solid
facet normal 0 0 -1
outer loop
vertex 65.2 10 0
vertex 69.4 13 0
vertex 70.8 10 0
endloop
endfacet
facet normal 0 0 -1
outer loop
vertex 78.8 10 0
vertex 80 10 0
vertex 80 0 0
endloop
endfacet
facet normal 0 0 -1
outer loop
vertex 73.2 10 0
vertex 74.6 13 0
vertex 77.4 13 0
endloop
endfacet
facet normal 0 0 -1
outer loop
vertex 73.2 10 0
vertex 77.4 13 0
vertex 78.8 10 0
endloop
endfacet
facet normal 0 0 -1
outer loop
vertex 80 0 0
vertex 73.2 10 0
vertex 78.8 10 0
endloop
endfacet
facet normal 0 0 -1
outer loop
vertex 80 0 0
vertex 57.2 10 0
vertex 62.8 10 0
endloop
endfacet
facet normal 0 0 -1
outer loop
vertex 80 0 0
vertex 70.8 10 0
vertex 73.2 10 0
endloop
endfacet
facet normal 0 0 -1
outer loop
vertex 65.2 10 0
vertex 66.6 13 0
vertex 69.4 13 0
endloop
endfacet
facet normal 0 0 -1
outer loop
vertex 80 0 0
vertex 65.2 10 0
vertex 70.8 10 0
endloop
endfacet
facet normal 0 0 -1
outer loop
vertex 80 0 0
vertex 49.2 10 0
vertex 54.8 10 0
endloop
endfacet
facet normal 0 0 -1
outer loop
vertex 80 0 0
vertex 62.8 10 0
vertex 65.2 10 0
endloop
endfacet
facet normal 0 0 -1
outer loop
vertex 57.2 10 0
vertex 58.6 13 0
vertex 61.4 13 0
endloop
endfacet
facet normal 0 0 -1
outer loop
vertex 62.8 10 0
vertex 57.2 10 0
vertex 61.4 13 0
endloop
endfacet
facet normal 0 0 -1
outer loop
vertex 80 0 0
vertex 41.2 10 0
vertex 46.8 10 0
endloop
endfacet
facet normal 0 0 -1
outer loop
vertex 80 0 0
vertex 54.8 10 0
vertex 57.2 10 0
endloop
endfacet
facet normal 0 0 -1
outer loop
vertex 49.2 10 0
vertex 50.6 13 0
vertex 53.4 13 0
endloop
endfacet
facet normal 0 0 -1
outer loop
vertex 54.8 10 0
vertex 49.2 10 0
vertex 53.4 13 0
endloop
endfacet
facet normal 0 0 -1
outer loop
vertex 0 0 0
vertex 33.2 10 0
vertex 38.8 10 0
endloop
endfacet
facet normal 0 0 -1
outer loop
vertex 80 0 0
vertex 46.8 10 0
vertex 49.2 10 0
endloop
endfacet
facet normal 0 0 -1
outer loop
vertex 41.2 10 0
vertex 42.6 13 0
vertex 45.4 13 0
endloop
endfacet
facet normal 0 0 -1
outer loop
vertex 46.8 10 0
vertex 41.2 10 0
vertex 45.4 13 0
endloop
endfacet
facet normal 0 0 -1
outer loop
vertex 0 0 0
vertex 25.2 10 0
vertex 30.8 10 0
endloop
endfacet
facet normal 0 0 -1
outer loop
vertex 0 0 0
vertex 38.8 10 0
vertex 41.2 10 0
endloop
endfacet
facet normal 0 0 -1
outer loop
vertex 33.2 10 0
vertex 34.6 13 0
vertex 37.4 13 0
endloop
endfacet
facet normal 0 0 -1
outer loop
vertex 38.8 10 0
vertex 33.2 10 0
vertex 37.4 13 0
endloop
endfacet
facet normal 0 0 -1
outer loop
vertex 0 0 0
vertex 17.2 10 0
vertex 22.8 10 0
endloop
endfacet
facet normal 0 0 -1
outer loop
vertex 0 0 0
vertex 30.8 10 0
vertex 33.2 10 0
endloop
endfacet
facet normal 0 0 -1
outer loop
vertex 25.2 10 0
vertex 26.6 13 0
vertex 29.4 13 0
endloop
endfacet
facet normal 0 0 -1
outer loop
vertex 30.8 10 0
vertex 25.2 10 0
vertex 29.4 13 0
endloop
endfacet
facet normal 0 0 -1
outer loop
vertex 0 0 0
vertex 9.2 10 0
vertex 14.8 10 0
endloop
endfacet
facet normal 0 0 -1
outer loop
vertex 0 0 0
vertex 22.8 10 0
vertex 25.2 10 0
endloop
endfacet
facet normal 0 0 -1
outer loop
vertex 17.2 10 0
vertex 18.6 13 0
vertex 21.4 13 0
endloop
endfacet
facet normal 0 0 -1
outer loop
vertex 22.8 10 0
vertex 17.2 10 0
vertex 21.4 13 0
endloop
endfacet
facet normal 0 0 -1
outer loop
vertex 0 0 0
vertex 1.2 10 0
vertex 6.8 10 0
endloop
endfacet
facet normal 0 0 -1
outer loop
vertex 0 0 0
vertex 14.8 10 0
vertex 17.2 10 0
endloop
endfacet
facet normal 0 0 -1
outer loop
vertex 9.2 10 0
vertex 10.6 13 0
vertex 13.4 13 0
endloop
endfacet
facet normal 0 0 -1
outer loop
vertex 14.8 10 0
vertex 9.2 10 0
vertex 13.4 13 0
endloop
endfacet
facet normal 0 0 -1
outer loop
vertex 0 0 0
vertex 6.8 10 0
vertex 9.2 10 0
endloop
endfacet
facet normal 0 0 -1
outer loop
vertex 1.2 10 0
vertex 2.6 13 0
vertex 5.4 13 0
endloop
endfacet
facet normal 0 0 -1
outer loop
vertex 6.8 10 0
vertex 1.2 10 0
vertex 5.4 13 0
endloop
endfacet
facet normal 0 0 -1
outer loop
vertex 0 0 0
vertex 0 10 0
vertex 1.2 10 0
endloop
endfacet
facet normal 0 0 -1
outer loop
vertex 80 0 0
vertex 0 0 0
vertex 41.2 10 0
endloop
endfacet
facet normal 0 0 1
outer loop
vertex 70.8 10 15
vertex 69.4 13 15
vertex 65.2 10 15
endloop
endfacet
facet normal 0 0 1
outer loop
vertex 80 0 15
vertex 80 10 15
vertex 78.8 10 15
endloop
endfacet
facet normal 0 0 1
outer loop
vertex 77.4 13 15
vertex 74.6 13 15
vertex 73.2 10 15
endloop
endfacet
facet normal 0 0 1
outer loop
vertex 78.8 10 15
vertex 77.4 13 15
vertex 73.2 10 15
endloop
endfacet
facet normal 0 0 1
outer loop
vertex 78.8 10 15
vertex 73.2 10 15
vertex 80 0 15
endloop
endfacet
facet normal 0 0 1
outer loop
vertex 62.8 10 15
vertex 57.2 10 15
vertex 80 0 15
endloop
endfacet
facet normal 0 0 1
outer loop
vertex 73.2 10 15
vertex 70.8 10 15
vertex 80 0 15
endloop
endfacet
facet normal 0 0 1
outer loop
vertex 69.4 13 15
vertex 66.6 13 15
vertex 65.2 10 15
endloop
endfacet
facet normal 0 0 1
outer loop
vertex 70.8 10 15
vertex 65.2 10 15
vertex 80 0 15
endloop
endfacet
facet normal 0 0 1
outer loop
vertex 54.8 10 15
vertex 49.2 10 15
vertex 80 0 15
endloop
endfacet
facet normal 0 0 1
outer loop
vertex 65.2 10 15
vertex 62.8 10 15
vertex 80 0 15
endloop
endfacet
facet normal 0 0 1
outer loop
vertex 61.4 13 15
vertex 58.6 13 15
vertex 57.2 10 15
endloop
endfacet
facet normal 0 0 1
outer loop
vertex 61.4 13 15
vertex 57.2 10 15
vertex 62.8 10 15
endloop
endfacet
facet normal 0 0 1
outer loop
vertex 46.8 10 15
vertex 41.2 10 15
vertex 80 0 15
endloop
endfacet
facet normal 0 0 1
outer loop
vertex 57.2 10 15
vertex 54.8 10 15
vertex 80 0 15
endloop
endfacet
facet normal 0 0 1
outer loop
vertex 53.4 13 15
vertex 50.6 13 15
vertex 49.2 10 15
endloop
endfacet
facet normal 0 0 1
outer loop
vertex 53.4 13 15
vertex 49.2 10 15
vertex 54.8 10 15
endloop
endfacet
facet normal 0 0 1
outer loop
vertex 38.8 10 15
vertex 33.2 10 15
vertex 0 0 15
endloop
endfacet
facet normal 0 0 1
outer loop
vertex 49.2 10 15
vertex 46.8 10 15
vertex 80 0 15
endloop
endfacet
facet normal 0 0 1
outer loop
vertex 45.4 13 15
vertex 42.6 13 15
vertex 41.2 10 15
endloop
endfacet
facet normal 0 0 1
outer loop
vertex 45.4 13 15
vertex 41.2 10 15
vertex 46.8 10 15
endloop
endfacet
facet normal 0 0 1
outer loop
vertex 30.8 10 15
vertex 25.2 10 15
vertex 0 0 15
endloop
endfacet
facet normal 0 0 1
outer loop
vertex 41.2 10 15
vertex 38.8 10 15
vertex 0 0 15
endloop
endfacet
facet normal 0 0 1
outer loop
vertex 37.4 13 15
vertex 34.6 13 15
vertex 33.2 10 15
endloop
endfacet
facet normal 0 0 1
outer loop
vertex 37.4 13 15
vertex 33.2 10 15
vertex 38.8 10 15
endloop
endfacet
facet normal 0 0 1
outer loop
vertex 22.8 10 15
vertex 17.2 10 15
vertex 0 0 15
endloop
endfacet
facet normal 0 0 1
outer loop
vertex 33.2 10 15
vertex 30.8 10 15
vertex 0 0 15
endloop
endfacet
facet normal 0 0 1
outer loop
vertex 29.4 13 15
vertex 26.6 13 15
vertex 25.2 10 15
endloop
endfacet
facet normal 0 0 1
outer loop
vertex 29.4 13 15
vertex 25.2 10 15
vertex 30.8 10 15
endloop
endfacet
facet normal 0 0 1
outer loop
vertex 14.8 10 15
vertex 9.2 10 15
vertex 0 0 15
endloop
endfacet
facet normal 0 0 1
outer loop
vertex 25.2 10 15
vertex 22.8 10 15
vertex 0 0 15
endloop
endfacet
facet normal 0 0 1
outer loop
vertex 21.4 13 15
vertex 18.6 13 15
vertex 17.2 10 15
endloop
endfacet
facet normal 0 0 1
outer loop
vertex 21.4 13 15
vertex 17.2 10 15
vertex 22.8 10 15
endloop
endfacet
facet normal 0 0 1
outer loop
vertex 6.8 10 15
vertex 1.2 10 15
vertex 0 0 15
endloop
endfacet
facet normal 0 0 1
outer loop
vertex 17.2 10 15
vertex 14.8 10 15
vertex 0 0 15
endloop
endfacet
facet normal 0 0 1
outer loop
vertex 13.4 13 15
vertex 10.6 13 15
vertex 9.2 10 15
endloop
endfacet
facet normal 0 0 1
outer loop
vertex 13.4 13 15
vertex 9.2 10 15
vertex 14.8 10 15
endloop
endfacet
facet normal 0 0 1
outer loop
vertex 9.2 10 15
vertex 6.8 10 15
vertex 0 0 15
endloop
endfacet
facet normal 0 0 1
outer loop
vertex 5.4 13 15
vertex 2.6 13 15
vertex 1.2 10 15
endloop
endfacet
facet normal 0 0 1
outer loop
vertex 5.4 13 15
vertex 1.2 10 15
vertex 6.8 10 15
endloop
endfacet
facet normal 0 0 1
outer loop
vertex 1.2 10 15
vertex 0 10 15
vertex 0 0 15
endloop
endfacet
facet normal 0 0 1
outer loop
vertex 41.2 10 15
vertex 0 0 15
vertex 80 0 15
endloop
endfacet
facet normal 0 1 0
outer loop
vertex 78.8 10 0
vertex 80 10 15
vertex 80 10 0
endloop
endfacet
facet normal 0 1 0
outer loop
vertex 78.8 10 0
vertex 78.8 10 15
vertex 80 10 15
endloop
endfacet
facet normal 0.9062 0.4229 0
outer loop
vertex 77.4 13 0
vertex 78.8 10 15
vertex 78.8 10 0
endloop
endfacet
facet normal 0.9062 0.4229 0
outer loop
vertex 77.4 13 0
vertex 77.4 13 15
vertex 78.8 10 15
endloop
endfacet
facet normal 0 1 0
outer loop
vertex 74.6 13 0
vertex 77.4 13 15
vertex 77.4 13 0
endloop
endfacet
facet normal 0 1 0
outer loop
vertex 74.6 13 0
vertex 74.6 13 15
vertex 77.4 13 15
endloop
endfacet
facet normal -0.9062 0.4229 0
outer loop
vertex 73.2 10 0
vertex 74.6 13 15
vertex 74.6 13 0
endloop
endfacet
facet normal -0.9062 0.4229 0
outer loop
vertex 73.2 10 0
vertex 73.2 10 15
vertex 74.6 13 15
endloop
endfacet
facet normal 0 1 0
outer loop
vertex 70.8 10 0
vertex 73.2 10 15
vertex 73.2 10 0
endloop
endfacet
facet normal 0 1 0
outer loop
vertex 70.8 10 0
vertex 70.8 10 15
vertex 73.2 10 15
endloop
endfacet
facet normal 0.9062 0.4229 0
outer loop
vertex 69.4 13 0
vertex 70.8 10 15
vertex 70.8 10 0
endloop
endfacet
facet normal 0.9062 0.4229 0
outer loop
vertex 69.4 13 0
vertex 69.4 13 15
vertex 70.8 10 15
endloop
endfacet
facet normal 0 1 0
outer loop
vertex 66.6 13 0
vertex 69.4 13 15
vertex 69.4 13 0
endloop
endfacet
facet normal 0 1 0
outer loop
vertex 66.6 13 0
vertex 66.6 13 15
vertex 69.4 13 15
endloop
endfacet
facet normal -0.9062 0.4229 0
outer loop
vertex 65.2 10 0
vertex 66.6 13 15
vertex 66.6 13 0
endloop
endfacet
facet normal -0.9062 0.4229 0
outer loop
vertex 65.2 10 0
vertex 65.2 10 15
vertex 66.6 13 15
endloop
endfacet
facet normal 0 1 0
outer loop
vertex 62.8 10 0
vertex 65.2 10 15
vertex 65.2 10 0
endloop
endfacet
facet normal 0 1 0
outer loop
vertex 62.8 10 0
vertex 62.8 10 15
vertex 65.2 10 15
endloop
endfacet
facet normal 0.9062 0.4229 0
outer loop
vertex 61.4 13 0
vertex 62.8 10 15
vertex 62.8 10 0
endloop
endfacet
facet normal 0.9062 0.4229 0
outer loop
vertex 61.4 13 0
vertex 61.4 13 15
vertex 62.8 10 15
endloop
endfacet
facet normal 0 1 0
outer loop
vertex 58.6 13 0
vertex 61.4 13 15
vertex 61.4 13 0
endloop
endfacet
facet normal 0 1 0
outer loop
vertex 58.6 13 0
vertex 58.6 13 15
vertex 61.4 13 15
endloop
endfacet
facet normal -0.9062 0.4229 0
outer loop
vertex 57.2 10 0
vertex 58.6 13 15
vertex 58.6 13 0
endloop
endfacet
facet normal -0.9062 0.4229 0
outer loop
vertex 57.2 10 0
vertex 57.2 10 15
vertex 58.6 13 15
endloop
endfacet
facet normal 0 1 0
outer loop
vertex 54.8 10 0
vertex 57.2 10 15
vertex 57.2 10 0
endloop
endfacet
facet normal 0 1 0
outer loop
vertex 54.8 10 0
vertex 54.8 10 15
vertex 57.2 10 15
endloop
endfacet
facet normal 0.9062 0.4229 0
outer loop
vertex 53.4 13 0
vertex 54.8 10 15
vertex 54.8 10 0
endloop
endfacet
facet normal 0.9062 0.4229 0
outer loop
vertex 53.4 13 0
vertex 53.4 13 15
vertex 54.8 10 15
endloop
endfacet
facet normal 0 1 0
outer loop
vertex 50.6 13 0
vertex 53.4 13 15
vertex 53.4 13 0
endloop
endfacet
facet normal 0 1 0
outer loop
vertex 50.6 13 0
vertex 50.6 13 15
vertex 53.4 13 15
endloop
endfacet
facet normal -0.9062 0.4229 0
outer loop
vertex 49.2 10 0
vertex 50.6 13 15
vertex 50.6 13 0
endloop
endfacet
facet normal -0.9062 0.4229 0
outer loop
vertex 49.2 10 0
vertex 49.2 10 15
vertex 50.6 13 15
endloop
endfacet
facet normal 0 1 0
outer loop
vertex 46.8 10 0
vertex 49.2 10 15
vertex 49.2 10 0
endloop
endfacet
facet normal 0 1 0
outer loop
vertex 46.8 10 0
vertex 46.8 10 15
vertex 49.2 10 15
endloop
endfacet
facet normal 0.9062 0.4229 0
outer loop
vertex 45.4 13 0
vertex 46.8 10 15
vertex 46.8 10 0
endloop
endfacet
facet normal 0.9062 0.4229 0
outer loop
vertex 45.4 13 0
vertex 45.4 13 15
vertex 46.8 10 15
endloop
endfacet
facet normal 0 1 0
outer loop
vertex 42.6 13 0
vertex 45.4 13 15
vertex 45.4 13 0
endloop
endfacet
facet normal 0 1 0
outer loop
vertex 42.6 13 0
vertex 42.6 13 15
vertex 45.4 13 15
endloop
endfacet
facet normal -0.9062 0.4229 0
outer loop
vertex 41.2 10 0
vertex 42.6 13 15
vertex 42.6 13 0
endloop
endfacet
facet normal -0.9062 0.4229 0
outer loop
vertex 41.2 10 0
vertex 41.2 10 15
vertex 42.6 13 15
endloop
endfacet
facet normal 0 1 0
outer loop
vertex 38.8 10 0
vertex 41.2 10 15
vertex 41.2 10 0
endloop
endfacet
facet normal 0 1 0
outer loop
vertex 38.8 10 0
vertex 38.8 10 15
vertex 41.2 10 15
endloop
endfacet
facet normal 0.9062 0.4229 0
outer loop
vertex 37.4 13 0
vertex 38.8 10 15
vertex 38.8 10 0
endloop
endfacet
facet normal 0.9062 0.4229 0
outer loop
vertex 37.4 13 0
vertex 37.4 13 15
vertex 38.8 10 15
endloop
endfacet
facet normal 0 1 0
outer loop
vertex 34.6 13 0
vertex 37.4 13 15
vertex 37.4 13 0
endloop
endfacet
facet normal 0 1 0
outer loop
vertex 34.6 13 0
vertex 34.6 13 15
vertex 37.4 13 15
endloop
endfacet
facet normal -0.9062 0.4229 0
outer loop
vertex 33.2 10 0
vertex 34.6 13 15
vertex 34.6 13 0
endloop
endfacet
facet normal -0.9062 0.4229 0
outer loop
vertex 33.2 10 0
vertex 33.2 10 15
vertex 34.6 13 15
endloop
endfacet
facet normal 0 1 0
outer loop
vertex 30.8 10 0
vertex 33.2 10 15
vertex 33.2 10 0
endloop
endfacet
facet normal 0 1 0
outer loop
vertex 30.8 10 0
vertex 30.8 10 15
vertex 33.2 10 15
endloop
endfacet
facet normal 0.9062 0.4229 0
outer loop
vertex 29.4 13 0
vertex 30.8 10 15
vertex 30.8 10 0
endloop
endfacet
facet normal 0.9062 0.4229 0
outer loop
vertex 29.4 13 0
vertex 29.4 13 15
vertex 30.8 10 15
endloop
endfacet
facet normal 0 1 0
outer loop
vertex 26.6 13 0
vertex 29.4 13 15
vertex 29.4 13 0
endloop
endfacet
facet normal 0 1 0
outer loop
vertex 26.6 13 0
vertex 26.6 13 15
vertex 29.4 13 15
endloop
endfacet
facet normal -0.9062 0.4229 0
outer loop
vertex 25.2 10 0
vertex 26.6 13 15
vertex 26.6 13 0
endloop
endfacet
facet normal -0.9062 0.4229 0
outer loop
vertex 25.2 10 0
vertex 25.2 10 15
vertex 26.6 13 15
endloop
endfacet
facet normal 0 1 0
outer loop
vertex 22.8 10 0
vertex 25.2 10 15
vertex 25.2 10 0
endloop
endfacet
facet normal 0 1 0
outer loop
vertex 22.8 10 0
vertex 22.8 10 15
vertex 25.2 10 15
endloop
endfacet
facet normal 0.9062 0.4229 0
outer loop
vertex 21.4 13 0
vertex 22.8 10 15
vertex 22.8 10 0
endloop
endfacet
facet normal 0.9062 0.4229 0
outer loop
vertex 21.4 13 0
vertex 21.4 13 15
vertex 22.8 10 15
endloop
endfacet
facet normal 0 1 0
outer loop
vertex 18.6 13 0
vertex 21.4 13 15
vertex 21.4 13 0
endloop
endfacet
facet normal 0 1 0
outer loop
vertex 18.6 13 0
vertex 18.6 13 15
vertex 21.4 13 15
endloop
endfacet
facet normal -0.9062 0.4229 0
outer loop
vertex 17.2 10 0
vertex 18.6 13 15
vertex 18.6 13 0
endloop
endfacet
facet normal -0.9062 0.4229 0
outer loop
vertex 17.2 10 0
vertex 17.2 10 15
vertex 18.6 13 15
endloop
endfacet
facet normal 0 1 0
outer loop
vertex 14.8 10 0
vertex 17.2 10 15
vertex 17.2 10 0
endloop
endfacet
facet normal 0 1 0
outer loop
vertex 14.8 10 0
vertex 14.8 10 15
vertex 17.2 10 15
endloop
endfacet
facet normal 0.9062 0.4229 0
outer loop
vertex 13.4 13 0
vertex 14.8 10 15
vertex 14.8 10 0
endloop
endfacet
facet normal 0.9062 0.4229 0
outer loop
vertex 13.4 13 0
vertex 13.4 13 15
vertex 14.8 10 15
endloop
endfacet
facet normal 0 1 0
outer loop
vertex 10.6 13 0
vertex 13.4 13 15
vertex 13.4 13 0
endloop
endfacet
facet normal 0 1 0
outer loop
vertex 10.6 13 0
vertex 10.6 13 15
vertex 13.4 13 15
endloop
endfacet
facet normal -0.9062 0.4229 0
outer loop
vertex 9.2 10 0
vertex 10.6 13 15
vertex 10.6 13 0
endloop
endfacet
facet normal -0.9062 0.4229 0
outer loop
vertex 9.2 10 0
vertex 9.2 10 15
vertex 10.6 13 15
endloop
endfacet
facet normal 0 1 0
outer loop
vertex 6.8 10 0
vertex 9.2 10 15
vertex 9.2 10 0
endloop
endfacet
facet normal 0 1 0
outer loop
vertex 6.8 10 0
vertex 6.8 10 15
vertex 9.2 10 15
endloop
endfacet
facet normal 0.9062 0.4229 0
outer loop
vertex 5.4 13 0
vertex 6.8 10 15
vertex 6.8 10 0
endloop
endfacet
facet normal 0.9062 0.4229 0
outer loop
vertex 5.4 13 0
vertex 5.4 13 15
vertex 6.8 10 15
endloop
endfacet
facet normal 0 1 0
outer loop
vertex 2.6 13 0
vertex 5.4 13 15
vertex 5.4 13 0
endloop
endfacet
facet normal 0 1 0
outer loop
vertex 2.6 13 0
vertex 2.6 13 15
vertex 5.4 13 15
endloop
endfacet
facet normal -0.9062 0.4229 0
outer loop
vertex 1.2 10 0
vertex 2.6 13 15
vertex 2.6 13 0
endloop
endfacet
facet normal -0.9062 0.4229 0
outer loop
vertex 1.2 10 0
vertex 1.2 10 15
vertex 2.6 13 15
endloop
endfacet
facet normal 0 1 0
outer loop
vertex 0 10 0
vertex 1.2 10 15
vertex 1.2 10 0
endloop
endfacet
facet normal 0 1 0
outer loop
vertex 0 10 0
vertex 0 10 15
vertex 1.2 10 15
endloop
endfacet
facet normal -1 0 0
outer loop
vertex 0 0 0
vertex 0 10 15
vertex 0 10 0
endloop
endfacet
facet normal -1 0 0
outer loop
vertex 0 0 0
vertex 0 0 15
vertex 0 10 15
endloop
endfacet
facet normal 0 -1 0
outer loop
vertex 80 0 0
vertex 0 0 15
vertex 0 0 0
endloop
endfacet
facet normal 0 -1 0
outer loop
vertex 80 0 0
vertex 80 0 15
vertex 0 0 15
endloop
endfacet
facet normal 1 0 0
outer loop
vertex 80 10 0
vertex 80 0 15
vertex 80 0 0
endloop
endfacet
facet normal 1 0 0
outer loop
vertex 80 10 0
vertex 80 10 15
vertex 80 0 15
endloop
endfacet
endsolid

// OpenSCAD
$fn = 32;

// ----------------------------------------------------------------------
// Gear rack: 10 teeth, pitch 8 mm
// ----------------------------------------------------------------------

// --- parameters (mm) ---
teeth = 10;               // number of teeth
pitch = 8;                // tooth pitch, X
root_w = 5.6;             // tooth width at the root
tip_w = 2.8;              // tooth width at the tip
base_h = 10;              // rack body height, Y
tooth_h = 3;              // tooth height above the body
plate_t = 15;             // rack width, Z (extrusion height)

rack_l = teeth * pitch;  // overall length
total_h = base_h + tooth_h;  // overall height

profile = [[0, 0], [80, 0], [80, 10], [78.8, 10], [77.4, 13], [74.6, 13], [73.2, 10], [70.8, 10], [69.4, 13], [66.6, 13], [65.2, 10], [62.8, 10], [61.4, 13], [58.6, 13], [57.2, 10], [54.8, 10], [53.4, 13], [50.6, 13], [49.2, 10], [46.8, 10], [45.4, 13], [42.6, 13], [41.2, 10], [38.8, 10], [37.4, 13], [34.6, 13], [33.2, 10], [30.8, 10], [29.4, 13], [26.6, 13], [25.2, 10], [22.8, 10], [21.4, 13], [18.6, 13], [17.2, 10], [14.8, 10], [13.4, 13], [10.6, 13], [9.2, 10], [6.8, 10], [5.4, 13], [2.6, 13], [1.2, 10], [0, 10]];  // primary outline, 44 points, counter clockwise

// --- the one profile operation ---
linear_extrude(height = plate_t) polygon(points = profile);
